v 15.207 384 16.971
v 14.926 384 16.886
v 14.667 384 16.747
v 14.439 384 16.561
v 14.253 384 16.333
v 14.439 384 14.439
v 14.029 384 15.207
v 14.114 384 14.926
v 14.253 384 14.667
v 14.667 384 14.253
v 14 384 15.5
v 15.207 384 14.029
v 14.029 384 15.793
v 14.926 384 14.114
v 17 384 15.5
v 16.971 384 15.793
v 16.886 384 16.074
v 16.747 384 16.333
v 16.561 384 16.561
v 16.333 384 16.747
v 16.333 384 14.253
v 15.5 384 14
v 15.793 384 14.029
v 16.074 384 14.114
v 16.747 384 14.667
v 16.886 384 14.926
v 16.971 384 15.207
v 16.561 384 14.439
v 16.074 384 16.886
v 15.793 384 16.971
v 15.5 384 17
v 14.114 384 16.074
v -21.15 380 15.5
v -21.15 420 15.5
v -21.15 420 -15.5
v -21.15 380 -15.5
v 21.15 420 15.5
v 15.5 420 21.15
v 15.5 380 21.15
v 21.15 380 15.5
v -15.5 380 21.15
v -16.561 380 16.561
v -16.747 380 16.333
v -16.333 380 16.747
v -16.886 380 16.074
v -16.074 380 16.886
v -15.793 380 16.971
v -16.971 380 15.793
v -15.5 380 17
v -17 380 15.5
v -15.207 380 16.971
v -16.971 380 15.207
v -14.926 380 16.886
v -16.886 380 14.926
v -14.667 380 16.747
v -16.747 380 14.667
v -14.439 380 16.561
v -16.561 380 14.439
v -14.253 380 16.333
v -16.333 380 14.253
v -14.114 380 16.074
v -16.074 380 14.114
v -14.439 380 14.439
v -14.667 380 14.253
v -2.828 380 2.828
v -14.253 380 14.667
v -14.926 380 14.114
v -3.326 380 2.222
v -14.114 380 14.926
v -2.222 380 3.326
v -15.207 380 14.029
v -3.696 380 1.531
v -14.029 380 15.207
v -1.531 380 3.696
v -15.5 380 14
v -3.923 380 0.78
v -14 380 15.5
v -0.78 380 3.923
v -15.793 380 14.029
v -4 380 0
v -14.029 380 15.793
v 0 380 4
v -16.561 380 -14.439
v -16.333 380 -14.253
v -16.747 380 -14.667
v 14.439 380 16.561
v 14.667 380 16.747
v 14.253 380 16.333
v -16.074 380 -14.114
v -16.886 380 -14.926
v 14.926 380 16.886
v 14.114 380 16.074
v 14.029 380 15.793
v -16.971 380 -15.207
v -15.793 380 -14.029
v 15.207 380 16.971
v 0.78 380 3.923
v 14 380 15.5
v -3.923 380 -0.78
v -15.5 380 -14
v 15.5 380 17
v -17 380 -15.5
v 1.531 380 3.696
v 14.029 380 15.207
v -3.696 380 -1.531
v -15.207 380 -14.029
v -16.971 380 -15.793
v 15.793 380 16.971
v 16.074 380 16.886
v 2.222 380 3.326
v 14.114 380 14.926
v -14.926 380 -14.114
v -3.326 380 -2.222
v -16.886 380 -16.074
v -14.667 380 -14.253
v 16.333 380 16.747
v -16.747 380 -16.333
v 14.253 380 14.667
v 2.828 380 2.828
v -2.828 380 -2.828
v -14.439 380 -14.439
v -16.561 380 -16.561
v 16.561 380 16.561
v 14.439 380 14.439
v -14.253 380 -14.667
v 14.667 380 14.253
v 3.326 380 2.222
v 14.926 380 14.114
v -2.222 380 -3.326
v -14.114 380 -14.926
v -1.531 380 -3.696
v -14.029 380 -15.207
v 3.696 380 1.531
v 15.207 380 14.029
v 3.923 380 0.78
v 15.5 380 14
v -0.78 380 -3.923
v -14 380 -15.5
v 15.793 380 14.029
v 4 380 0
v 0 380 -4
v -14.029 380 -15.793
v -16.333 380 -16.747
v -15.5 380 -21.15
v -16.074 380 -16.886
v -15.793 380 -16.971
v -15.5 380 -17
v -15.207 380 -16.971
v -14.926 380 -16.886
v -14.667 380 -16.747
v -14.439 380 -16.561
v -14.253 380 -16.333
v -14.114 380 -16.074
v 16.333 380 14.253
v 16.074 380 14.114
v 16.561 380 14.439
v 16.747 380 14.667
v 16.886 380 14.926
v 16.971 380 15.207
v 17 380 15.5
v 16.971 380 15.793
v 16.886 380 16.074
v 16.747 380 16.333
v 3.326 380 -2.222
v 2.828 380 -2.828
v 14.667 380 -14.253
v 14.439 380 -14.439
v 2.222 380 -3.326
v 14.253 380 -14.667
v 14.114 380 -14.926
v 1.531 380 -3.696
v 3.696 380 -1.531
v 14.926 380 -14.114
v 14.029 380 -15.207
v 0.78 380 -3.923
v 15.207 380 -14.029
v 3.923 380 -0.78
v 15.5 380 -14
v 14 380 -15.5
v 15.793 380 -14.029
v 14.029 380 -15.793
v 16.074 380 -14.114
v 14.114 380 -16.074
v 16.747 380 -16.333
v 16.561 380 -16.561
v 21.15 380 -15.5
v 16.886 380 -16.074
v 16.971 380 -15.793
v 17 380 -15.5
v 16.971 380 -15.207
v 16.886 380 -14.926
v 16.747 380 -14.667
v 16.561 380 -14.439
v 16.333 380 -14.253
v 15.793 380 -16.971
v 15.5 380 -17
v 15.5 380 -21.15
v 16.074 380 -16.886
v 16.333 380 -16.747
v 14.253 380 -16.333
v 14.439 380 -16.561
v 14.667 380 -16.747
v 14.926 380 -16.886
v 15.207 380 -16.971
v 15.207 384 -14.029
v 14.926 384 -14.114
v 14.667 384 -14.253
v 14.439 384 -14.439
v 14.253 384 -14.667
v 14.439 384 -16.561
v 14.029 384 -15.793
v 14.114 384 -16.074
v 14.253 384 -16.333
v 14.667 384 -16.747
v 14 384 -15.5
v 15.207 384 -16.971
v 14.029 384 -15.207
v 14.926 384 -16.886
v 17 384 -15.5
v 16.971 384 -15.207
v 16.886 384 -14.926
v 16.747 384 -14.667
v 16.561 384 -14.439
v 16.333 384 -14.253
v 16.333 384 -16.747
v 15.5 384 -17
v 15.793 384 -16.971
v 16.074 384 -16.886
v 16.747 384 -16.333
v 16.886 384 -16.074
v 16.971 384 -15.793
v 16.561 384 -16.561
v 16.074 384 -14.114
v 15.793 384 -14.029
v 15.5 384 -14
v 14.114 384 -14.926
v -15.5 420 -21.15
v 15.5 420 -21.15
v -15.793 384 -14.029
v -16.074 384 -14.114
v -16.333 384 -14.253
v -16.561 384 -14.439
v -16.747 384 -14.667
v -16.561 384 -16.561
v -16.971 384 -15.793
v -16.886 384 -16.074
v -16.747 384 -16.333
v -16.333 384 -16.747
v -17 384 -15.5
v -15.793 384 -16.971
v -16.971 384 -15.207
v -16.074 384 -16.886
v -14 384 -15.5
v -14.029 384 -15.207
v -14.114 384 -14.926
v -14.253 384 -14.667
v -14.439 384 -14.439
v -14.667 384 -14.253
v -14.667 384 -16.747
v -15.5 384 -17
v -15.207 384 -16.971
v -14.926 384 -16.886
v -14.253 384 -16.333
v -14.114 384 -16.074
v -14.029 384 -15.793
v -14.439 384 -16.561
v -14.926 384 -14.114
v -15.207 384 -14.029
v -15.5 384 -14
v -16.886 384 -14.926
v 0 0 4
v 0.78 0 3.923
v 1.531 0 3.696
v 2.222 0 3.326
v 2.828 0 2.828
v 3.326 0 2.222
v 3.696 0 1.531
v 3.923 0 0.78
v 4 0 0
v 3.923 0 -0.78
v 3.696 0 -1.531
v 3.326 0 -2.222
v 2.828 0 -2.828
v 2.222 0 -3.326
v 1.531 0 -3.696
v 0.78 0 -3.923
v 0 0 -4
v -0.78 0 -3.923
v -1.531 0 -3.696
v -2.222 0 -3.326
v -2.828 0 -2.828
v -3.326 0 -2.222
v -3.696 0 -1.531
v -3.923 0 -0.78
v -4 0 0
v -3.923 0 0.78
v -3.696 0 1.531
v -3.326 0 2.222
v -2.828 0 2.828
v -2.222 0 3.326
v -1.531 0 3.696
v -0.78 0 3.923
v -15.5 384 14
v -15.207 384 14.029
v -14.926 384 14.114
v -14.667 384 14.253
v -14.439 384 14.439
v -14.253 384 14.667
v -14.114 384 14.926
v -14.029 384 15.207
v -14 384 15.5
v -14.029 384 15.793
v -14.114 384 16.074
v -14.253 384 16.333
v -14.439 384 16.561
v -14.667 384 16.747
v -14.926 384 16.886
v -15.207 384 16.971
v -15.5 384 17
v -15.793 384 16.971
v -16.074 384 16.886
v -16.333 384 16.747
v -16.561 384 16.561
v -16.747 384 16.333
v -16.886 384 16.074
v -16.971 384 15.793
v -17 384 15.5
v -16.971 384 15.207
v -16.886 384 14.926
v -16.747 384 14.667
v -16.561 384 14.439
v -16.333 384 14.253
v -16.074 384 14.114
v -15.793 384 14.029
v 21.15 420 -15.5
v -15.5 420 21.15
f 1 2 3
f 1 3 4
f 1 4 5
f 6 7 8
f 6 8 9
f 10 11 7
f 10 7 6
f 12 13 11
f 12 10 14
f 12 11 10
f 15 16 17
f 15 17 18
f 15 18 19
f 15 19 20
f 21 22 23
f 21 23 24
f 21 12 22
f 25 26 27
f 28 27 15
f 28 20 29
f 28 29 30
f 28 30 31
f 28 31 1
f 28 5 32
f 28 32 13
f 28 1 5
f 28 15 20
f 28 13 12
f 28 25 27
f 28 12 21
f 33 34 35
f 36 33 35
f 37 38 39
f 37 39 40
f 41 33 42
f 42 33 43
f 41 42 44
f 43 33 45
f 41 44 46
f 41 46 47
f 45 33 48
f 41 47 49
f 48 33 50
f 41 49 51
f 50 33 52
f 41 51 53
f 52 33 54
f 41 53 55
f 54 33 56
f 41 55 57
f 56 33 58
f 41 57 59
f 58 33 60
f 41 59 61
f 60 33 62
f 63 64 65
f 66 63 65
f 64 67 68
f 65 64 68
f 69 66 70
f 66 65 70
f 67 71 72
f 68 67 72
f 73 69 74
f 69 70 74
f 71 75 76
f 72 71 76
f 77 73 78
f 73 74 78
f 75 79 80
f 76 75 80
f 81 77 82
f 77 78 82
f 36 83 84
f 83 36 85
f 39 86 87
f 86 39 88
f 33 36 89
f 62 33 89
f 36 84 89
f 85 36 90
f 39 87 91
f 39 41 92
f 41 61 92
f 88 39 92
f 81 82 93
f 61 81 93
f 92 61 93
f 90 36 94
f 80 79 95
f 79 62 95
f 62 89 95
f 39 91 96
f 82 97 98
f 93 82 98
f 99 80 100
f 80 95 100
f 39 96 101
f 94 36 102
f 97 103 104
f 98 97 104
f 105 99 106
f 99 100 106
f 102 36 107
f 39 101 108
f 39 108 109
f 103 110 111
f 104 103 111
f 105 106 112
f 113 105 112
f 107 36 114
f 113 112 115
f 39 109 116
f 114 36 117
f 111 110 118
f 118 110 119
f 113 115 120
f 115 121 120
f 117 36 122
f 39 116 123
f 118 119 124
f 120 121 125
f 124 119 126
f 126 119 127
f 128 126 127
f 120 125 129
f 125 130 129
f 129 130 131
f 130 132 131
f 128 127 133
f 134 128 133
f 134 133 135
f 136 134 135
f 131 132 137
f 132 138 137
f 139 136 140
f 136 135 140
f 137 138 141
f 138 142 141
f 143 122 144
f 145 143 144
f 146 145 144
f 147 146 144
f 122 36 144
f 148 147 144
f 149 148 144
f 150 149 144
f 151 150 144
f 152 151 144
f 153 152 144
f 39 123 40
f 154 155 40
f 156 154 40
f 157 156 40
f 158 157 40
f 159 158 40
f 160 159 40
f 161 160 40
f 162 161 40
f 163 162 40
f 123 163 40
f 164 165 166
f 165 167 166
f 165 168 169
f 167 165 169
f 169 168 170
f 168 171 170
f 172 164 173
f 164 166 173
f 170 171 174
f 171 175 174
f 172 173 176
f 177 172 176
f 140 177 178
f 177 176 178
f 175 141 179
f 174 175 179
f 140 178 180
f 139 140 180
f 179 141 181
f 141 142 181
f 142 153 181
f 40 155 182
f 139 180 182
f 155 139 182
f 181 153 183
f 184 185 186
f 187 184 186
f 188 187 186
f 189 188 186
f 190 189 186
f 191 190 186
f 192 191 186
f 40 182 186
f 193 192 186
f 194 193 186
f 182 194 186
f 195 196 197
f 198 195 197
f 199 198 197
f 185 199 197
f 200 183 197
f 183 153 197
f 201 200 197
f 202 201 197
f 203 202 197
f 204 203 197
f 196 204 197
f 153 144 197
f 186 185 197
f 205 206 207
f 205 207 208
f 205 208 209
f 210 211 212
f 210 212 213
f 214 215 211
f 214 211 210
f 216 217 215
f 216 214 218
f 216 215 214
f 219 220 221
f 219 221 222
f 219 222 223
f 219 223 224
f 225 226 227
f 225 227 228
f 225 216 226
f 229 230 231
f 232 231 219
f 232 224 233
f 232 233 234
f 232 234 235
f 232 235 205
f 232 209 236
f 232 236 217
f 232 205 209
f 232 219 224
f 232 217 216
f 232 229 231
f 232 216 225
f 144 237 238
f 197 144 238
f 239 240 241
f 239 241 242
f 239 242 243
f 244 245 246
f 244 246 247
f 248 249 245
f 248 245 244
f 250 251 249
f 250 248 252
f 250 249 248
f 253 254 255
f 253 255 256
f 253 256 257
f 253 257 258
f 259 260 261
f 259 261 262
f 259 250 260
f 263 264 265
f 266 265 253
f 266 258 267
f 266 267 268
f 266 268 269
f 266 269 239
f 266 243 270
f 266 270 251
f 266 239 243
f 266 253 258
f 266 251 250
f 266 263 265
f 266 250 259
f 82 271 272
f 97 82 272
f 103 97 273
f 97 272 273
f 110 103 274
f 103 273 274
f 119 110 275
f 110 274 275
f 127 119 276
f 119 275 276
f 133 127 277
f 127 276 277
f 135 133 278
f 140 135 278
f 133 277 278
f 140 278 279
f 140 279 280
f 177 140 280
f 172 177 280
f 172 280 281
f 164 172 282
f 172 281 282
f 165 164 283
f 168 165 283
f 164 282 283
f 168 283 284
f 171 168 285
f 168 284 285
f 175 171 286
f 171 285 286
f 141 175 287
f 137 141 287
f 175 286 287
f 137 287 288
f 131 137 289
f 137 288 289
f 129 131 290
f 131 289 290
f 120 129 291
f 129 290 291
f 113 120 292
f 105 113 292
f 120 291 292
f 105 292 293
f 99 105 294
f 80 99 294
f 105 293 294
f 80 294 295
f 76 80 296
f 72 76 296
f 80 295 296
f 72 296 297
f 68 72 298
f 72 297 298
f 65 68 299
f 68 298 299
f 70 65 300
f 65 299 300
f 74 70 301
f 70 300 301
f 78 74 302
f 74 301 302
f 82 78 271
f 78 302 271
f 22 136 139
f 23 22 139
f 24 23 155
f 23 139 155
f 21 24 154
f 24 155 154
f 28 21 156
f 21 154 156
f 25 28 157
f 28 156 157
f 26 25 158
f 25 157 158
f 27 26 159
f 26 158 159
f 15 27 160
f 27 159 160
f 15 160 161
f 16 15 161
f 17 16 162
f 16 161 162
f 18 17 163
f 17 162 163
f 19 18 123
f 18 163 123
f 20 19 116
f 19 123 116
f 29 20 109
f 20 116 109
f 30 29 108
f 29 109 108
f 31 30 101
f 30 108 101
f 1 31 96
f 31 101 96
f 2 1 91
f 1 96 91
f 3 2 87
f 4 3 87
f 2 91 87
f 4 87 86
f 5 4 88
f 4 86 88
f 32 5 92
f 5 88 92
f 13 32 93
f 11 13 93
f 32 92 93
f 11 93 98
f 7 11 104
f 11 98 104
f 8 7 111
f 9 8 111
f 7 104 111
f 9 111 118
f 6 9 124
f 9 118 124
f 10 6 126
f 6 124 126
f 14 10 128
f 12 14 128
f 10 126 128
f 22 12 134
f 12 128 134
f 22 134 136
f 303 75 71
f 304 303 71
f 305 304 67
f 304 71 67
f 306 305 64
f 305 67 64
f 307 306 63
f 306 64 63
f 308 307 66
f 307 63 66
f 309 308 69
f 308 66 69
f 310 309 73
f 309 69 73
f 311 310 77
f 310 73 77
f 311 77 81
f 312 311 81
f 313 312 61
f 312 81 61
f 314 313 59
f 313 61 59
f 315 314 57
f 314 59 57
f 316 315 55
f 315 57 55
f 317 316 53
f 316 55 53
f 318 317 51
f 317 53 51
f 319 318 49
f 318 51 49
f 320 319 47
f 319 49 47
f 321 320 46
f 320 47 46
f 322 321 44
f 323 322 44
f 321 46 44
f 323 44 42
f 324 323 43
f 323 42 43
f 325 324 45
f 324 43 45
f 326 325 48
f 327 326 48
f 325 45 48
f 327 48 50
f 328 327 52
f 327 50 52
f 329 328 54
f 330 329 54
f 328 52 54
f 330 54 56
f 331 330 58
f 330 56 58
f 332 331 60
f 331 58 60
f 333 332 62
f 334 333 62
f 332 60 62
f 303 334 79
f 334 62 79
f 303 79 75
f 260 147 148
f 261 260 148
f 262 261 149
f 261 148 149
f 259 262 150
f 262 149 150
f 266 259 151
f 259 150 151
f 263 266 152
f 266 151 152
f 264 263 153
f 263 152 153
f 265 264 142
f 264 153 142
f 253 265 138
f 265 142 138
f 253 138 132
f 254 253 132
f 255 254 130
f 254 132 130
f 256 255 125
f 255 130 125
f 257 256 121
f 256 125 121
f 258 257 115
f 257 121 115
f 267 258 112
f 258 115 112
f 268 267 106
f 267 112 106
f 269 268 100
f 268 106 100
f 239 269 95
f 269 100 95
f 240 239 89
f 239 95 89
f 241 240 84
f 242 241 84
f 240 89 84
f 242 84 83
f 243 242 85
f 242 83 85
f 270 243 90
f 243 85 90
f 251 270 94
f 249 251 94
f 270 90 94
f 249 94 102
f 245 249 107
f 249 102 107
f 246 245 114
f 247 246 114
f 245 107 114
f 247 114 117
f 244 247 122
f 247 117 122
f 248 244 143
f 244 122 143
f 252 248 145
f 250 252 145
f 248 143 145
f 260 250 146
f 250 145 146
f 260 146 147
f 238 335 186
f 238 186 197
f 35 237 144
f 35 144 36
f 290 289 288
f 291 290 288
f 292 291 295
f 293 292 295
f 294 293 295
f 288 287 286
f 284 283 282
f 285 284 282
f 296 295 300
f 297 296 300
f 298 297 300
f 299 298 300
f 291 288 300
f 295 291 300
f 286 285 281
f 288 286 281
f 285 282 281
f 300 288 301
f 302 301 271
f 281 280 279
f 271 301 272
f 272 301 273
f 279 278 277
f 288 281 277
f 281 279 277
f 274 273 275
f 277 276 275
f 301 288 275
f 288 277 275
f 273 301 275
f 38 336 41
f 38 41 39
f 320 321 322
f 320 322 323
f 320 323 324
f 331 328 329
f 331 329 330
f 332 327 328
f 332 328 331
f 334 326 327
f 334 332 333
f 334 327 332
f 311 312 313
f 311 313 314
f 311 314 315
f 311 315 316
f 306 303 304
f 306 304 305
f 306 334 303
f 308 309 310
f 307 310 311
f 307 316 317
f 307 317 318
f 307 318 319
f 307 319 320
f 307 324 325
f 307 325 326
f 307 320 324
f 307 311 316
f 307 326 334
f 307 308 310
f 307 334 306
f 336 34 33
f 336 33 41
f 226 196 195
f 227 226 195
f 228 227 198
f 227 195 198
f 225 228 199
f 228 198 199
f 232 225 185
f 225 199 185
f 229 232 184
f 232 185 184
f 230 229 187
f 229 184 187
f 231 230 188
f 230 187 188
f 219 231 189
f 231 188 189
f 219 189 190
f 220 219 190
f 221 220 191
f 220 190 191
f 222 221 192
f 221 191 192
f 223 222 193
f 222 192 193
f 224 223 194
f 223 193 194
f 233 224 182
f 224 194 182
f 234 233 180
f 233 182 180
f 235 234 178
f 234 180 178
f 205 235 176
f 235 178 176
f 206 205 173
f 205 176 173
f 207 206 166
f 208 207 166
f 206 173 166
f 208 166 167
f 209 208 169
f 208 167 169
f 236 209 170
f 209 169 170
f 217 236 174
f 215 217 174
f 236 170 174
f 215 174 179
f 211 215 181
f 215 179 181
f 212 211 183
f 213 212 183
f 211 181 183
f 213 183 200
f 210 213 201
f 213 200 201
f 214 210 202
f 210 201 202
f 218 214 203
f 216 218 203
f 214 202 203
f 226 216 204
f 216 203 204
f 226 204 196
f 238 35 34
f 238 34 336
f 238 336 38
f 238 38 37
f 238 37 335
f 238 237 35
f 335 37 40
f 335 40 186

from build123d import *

# Parameters (mm, degrees)
SKETCH_1_R          = 4
EXTRUDE_1_DEPTH     = 380
SKETCH_5_W          = 42.3
SKETCH_5_H          = 42.3
EXTRUDE_5_DEPTH     = 40
SKETCH_7_OUTSIDE_W  = 129.148
SKETCH_7_OUTSIDE_H  = 129.148
CUT_EXTRUDE_1_DEPTH = 422.063706581
SKETCH_8_R          = 1.5
CUT_EXTRUDE_2_DEPTH = 4


with BuildPart() as part:
    # 草图1 → 凸台-拉伸1 (new body)
    with BuildSketch(Plane(origin=(0, 0, 0), x_dir=(1, 0, 0), z_dir=(0, 1, 0))):
        with Locations(Location((0, 0, 0), (0, 0, 270))):
            Circle(SKETCH_1_R)
    extrude(amount=EXTRUDE_1_DEPTH)

    # 草图5 → 凸台-拉伸5 (add)
    with BuildSketch(Plane(origin=(0, 380, 0), x_dir=(1, 0, 0), z_dir=(0, 1, 0))):
        Rectangle(SKETCH_5_W, SKETCH_5_H)
    extrude(amount=EXTRUDE_5_DEPTH)

    # 草图7 outside → 切除-拉伸1 (cut, through all)
    with BuildSketch(Plane(origin=(0, 420, 0), x_dir=(1, 0, 0), z_dir=(0, 1, 0))):
        Rectangle(SKETCH_7_OUTSIDE_W, SKETCH_7_OUTSIDE_H)
        Polygon((-15.5, 21.15), (-21.15, 15.5), (-21.15, -15.5), (-15.5, -21.15), (15.5, -21.15), (21.15, -15.5), (21.15, 15.5), (15.5, 21.15), align=None, mode=Mode.SUBTRACT)
    extrude(amount=-CUT_EXTRUDE_1_DEPTH, mode=Mode.SUBTRACT)

    # 草图8 → 切除-拉伸2 (cut)
    with BuildSketch(Plane.XZ.offset(-380)):
        with Locations(Location((-15.5, 15.5, 0), (0, 0, 270))):
            Circle(SKETCH_8_R)
        with Locations(Location((15.5, 15.5, 0), (0, 0, 270))):
            Circle(SKETCH_8_R)
        with Locations(Location((15.5, -15.5, 0), (0, 0, 270))):
            Circle(SKETCH_8_R)
        with Locations(Location((-15.5, -15.5, 0), (0, 0, 270))):
            Circle(SKETCH_8_R)
    extrude(amount=-CUT_EXTRUDE_2_DEPTH, mode=Mode.SUBTRACT)


solid = part.part
